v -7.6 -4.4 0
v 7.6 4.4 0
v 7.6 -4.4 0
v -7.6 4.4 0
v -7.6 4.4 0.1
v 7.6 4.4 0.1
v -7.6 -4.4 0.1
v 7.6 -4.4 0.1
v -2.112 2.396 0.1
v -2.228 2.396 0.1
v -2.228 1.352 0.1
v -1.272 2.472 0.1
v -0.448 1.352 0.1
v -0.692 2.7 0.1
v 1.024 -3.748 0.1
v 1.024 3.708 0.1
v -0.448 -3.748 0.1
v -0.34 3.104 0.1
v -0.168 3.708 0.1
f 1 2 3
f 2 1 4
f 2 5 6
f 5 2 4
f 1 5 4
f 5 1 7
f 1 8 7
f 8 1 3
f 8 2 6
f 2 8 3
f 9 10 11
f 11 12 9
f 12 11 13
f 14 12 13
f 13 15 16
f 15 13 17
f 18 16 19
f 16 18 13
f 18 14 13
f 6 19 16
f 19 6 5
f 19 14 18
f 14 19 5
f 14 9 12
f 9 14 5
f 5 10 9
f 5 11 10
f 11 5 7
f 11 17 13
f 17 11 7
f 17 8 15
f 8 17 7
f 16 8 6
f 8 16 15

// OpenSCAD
// file: ../p/4-4edge.scad
use <../lib.scad>
$fa=1; $fs=0.2;
function ldraw_lib__4_4edge(realsolid=false) = [
// 0 Circle 1.0
// 0 Name: 4-4edge.dat
// 0 Author: James Jessiman
// 0 !LDRAW_ORG Primitive UPDATE 2017-01
// 0 !LICENSE Licensed under CC BY 2.0 and CC BY 4.0 : see CAreadme.txt
// 
// 0 BFC CERTIFY CCW
  [0,"BFC","CERTIFY"],
  [0,"BFC","CCW"],
// 
// 0 !HISTORY 1998-12-15 [PTadmin] Official Update 1998-10
// 0 !HISTORY 2005-12-28 [PTadmin] Official Update 2005-01
// 0 !HISTORY 2007-06-24 [PTadmin] Header formatted for Contributor Agreement
// 0 !HISTORY 2008-07-01 [PTadmin] Official Update 2008-01
// 0 !HISTORY 2017-01-15 [Steffen] BFCed
// 0 !HISTORY 2017-12-30 [PTadmin] Official Update 2017-01
// 
// 
// 2 24 1 0 0 0.9239 0 0.3827
  [2,24,1,0,0,0.9239,0,0.3827],
// 2 24 0.9239 0 0.3827 0.7071 0 0.7071
  [2,24,0.9239,0,0.3827,0.7071,0,0.7071],
// 2 24 0.7071 0 0.7071 0.3827 0 0.9239
  [2,24,0.7071,0,0.7071,0.3827,0,0.9239],
// 2 24 0.3827 0 0.9239 0 0 1
  [2,24,0.3827,0,0.9239,0,0,1],
// 2 24 0 0 1 -0.3827 0 0.9239
  [2,24,0,0,1,-0.3827,0,0.9239],
// 2 24 -0.3827 0 0.9239 -0.7071 0 0.7071
  [2,24,-0.3827,0,0.9239,-0.7071,0,0.7071],
// 2 24 -0.7071 0 0.7071 -0.9239 0 0.3827
  [2,24,-0.7071,0,0.7071,-0.9239,0,0.3827],
// 2 24 -0.9239 0 0.3827 -1 0 -0
  [2,24,-0.9239,0,0.3827,-1,0,-0],
// 2 24 -1 0 -0 -0.9239 0 -0.3827
  [2,24,-1,0,-0,-0.9239,0,-0.3827],
// 2 24 -0.9239 0 -0.3827 -0.7071 0 -0.7071
  [2,24,-0.9239,0,-0.3827,-0.7071,0,-0.7071],
// 2 24 -0.7071 0 -0.7071 -0.3827 0 -0.9239
  [2,24,-0.7071,0,-0.7071,-0.3827,0,-0.9239],
// 2 24 -0.3827 0 -0.9239 0 0 -1
  [2,24,-0.3827,0,-0.9239,0,0,-1],
// 2 24 0 0 -1 0.3827 0 -0.9239
  [2,24,0,0,-1,0.3827,0,-0.9239],
// 2 24 0.3827 0 -0.9239 0.7071 0 -0.7071
  [2,24,0.3827,0,-0.9239,0.7071,0,-0.7071],
// 2 24 0.7071 0 -0.7071 0.9239 0 -0.3827
  [2,24,0.7071,0,-0.7071,0.9239,0,-0.3827],
// 2 24 0.9239 0 -0.3827 1 0 0
  [2,24,0.9239,0,-0.3827,1,0,0],
];
module ldraw_lib__4_4edge(step=0, col=false, unit=2/5, alt=false, line=0.2, solid=!$preview)
    makepoly(ldraw_lib__4_4edge(solid), step=step, col=col, unit=unit, alt=alt, line=line, solid=solid);
ldraw_lib__4_4edge(line=0.2);
// file: ../p/4-4disc.scad
use <../lib.scad>
$fa=1; $fs=0.2;
function ldraw_lib__4_4disc(realsolid=false) = [
// 0 Disc 1.0
// 0 Name: 4-4disc.dat
// 0 Author: James Jessiman
// 0 !LDRAW_ORG Primitive UPDATE 2002-02
// 0 !LICENSE Licensed under CC BY 2.0 and CC BY 4.0 : see CAreadme.txt
// 
// 0 BFC CERTIFY CCW
  [0,"BFC","CERTIFY"],
  [0,"BFC","CCW"],
// 
// 0 !HISTORY 1998-12-15 [PTadmin] Official Update 1998-10
// 0 !HISTORY 2002-03-23 [sbliss] Added BFC statement
// 0 !HISTORY 2002-04-25 [PTadmin] Official Update 2002-02
// 0 !HISTORY 2007-06-24 [PTadmin] Header formatted for Contributor Agreement
// 0 !HISTORY 2008-07-01 [PTadmin] Official Update 2008-01
// 
// 
// 3 16 0 0 0 1 0 0 0.9239 0 0.3827
  [3,16,0,0,0,1,0,0,0.9239,0,0.3827],
// 3 16 0 0 0 0.9239 0 0.3827 0.7071 0 0.7071
  [3,16,0,0,0,0.9239,0,0.3827,0.7071,0,0.7071],
// 3 16 0 0 0 0.7071 0 0.7071 0.3827 0 0.9239
  [3,16,0,0,0,0.7071,0,0.7071,0.3827,0,0.9239],
// 3 16 0 0 0 0.3827 0 0.9239 0 0 1
  [3,16,0,0,0,0.3827,0,0.9239,0,0,1],
// 3 16 0 0 0 0 0 1 -0.3827 0 0.9239
  [3,16,0,0,0,0,0,1,-0.3827,0,0.9239],
// 3 16 0 0 0 -0.3827 0 0.9239 -0.7071 0 0.7071
  [3,16,0,0,0,-0.3827,0,0.9239,-0.7071,0,0.7071],
// 3 16 0 0 0 -0.7071 0 0.7071 -0.9239 0 0.3827
  [3,16,0,0,0,-0.7071,0,0.7071,-0.9239,0,0.3827],
// 3 16 0 0 0 -0.9239 0 0.3827 -1 0 -0
  [3,16,0,0,0,-0.9239,0,0.3827,-1,0,-0],
// 3 16 0 0 0 -1 0 -0 -0.9239 0 -0.3827
  [3,16,0,0,0,-1,0,-0,-0.9239,0,-0.3827],
// 3 16 0 0 0 -0.9239 0 -0.3827 -0.7071 0 -0.7071
  [3,16,0,0,0,-0.9239,0,-0.3827,-0.7071,0,-0.7071],
// 3 16 0 0 0 -0.7071 0 -0.7071 -0.3827 0 -0.9239
  [3,16,0,0,0,-0.7071,0,-0.7071,-0.3827,0,-0.9239],
// 3 16 0 0 0 -0.3827 0 -0.9239 0 0 -1
  [3,16,0,0,0,-0.3827,0,-0.9239,0,0,-1],
// 3 16 0 0 0 0 0 -1 0.3827 0 -0.9239
  [3,16,0,0,0,0,0,-1,0.3827,0,-0.9239],
// 3 16 0 0 0 0.3827 0 -0.9239 0.7071 0 -0.7071
  [3,16,0,0,0,0.3827,0,-0.9239,0.7071,0,-0.7071],
// 3 16 0 0 0 0.7071 0 -0.7071 0.9239 0 -0.3827
  [3,16,0,0,0,0.7071,0,-0.7071,0.9239,0,-0.3827],
// 3 16 0 0 0 0.9239 0 -0.3827 1 0 0
  [3,16,0,0,0,0.9239,0,-0.3827,1,0,0],
// 0
];
module ldraw_lib__4_4disc(step=0, col=false, unit=2/5, alt=false, line=0.2, solid=!$preview)
    makepoly(ldraw_lib__4_4disc(solid), step=step, col=col, unit=unit, alt=alt, line=line, solid=solid);
ldraw_lib__4_4disc(line=0.2);
// file: ../p/4-4cyli.scad
use <../lib.scad>
$fa=1; $fs=0.2;
function ldraw_lib__4_4cyli(realsolid=false) = [
// 0 Cylinder 1.0
// 0 Name: 4-4cyli.dat
// 0 Author: James Jessiman
// 0 !LDRAW_ORG Primitive UPDATE 2005-01
// 0 !LICENSE Licensed under CC BY 2.0 and CC BY 4.0 : see CAreadme.txt
// 
// 0 BFC CERTIFY CCW
  [0,"BFC","CERTIFY"],
  [0,"BFC","CCW"],
// 
// 0 !HISTORY 1998-12-15 [PTadmin] Official Update 1998-10
// 0 !HISTORY 2002-03-23 [sbliss] Added BFC statement; merged headers from files in distributions LDraw 0.27 and Complete.
// 0 !HISTORY 2002-04-25 [PTadmin] Official Update 2002-02
// 0 !HISTORY 2004-12-14 [guyvivan] BFC CCW
// 0 !HISTORY 2005-12-28 [PTadmin] Official Update 2005-01
// 0 !HISTORY 2007-06-24 [PTadmin] Header formatted for Contributor Agreement
// 0 !HISTORY 2008-07-01 [PTadmin] Official Update 2008-01
// 
// 
// 4 16 1 1 0 0.9239 1 0.3827 0.9239 0 0.3827 1 0 0
  [4,16,1,1,0,0.9239,1,0.3827,0.9239,0,0.3827,1,0,0],
// 5 24 1 0 0 1 1 0 0.9239 0 0.3827 0.9239 0 -0.3827
  [5,24,1,0,0,1,1,0,0.9239,0,0.3827,0.9239,0,-0.3827],
// 4 16 0.9239 1 0.3827 0.7071 1 0.7071 0.7071 0 0.7071 0.9239 0 0.3827
  [4,16,0.9239,1,0.3827,0.7071,1,0.7071,0.7071,0,0.7071,0.9239,0,0.3827],
// 5 24 0.9239 0 0.3827 0.9239 1 0.3827 0.7071 0 0.7071 1 0 0
  [5,24,0.9239,0,0.3827,0.9239,1,0.3827,0.7071,0,0.7071,1,0,0],
// 4 16 0.7071 1 0.7071 0.3827 1 0.9239 0.3827 0 0.9239 0.7071 0 0.7071
  [4,16,0.7071,1,0.7071,0.3827,1,0.9239,0.3827,0,0.9239,0.7071,0,0.7071],
// 5 24 0.7071 0 0.7071 0.7071 1 0.7071 0.3827 0 0.9239 0.9239 0 0.3827
  [5,24,0.7071,0,0.7071,0.7071,1,0.7071,0.3827,0,0.9239,0.9239,0,0.3827],
// 4 16 0.3827 1 0.9239 0 1 1 0 0 1 0.3827 0 0.9239
  [4,16,0.3827,1,0.9239,0,1,1,0,0,1,0.3827,0,0.9239],
// 5 24 0.3827 0 0.9239 0.3827 1 0.9239 0 0 1 0.7071 0 0.7071
  [5,24,0.3827,0,0.9239,0.3827,1,0.9239,0,0,1,0.7071,0,0.7071],
// 4 16 0 1 1 -0.3827 1 0.9239 -0.3827 0 0.9239 0 0 1
  [4,16,0,1,1,-0.3827,1,0.9239,-0.3827,0,0.9239,0,0,1],
// 5 24 0 0 1 0 1 1 -0.3827 0 0.9239 0.3827 0 0.9239
  [5,24,0,0,1,0,1,1,-0.3827,0,0.9239,0.3827,0,0.9239],
// 4 16 -0.3827 1 0.9239 -0.7071 1 0.7071 -0.7071 0 0.7071 -0.3827 0 0.9239
  [4,16,-0.3827,1,0.9239,-0.7071,1,0.7071,-0.7071,0,0.7071,-0.3827,0,0.9239],
// 5 24 -0.3827 0 0.9239 -0.3827 1 0.9239 -0.7071 0 0.7071 0 0 1
  [5,24,-0.3827,0,0.9239,-0.3827,1,0.9239,-0.7071,0,0.7071,0,0,1],
// 4 16 -0.7071 1 0.7071 -0.9239 1 0.3827 -0.9239 0 0.3827 -0.7071 0 0.7071
  [4,16,-0.7071,1,0.7071,-0.9239,1,0.3827,-0.9239,0,0.3827,-0.7071,0,0.7071],
// 5 24 -0.7071 0 0.7071 -0.7071 1 0.7071 -0.9239 0 0.3827 -0.3827 0 0.9239
  [5,24,-0.7071,0,0.7071,-0.7071,1,0.7071,-0.9239,0,0.3827,-0.3827,0,0.9239],
// 4 16 -0.9239 1 0.3827 -1 1 0 -1 0 0 -0.9239 0 0.3827
  [4,16,-0.9239,1,0.3827,-1,1,0,-1,0,0,-0.9239,0,0.3827],
// 5 24 -0.9239 0 0.3827 -0.9239 1 0.3827 -1 0 0 -0.7071 0 0.7071
  [5,24,-0.9239,0,0.3827,-0.9239,1,0.3827,-1,0,0,-0.7071,0,0.7071],
// 4 16 -1 1 0 -0.9239 1 -0.3827 -0.9239 0 -0.3827 -1 0 0
  [4,16,-1,1,0,-0.9239,1,-0.3827,-0.9239,0,-0.3827,-1,0,0],
// 5 24 -1 0 0 -1 1 0 -0.9239 0 -0.3827 -0.9239 0 0.3827
  [5,24,-1,0,0,-1,1,0,-0.9239,0,-0.3827,-0.9239,0,0.3827],
// 4 16 -0.9239 1 -0.3827 -0.7071 1 -0.7071 -0.7071 0 -0.7071 -0.9239 0 -0.3827
  [4,16,-0.9239,1,-0.3827,-0.7071,1,-0.7071,-0.7071,0,-0.7071,-0.9239,0,-0.3827],
// 5 24 -0.9239 0 -0.3827 -0.9239 1 -0.3827 -0.7071 0 -0.7071 -1 0 0
  [5,24,-0.9239,0,-0.3827,-0.9239,1,-0.3827,-0.7071,0,-0.7071,-1,0,0],
// 4 16 -0.7071 1 -0.7071 -0.3827 1 -0.9239 -0.3827 0 -0.9239 -0.7071 0 -0.7071
  [4,16,-0.7071,1,-0.7071,-0.3827,1,-0.9239,-0.3827,0,-0.9239,-0.7071,0,-0.7071],
// 5 24 -0.7071 0 -0.7071 -0.7071 1 -0.7071 -0.3827 0 -0.9239 -0.9239 0 -0.3827
  [5,24,-0.7071,0,-0.7071,-0.7071,1,-0.7071,-0.3827,0,-0.9239,-0.9239,0,-0.3827],
// 4 16 -0.3827 1 -0.9239 0 1 -1 0 0 -1 -0.3827 0 -0.9239
  [4,16,-0.3827,1,-0.9239,0,1,-1,0,0,-1,-0.3827,0,-0.9239],
// 5 24 -0.3827 0 -0.9239 -0.3827 1 -0.9239 0 0 -1 -0.7071 0 -0.7071
  [5,24,-0.3827,0,-0.9239,-0.3827,1,-0.9239,0,0,-1,-0.7071,0,-0.7071],
// 4 16 0 1 -1 0.3827 1 -0.9239 0.3827 0 -0.9239 0 0 -1
  [4,16,0,1,-1,0.3827,1,-0.9239,0.3827,0,-0.9239,0,0,-1],
// 5 24 0 0 -1 0 1 -1 0.3827 0 -0.9239 -0.3827 0 -0.9239
  [5,24,0,0,-1,0,1,-1,0.3827,0,-0.9239,-0.3827,0,-0.9239],
// 4 16 0.3827 1 -0.9239 0.7071 1 -0.7071 0.7071 0 -0.7071 0.3827 0 -0.9239
  [4,16,0.3827,1,-0.9239,0.7071,1,-0.7071,0.7071,0,-0.7071,0.3827,0,-0.9239],
// 5 24 0.3827 0 -0.9239 0.3827 1 -0.9239 0.7071 0 -0.7071 0 0 -1
  [5,24,0.3827,0,-0.9239,0.3827,1,-0.9239,0.7071,0,-0.7071,0,0,-1],
// 4 16 0.7071 1 -0.7071 0.9239 1 -0.3827 0.9239 0 -0.3827 0.7071 0 -0.7071
  [4,16,0.7071,1,-0.7071,0.9239,1,-0.3827,0.9239,0,-0.3827,0.7071,0,-0.7071],
// 5 24 0.7071 0 -0.7071 0.7071 1 -0.7071 0.9239 0 -0.3827 0.3827 0 -0.9239
  [5,24,0.7071,0,-0.7071,0.7071,1,-0.7071,0.9239,0,-0.3827,0.3827,0,-0.9239],
// 4 16 0.9239 1 -0.3827 1 1 0 1 0 0 0.9239 0 -0.3827
  [4,16,0.9239,1,-0.3827,1,1,0,1,0,0,0.9239,0,-0.3827],
// 5 24 0.9239 0 -0.3827 0.9239 1 -0.3827 1 0 0 0.7071 0 -0.7071
  [5,24,0.9239,0,-0.3827,0.9239,1,-0.3827,1,0,0,0.7071,0,-0.7071],
// 0
];
module ldraw_lib__4_4cyli(step=0, col=false, unit=2/5, alt=false, line=0.2, solid=!$preview)
    makepoly(ldraw_lib__4_4cyli(solid), step=step, col=col, unit=unit, alt=alt, line=line, solid=solid);
ldraw_lib__4_4cyli(line=0.2);
// file: ../p/stud3.scad
use <../lib.scad>
use <4-4cyli.scad>
use <4-4disc.scad>
use <4-4edge.scad>
$fa=1; $fs=0.2;
function ldraw_lib__stud3(realsolid=false) = realsolid ? 
    [openscad(translate([0,0,-eps()], o=cylinder(4+eps(), r=4)),2)] : [
// 0 Stud Tube Solid
// 0 Name: stud3.dat
// 0 Author: James Jessiman
// 0 !LDRAW_ORG Primitive UPDATE 2012-01
// 0 !LICENSE Licensed under CC BY 2.0 and CC BY 4.0 : see CAreadme.txt
// 
// 0 BFC CERTIFY CCW
  [0,"BFC","CERTIFY"],
  [0,"BFC","CCW"],
// 
// 0 !HISTORY 2002-04-04 [sbliss] Modified for BFC compliance
// 0 !HISTORY 2002-04-25 [PTadmin] Official Update 2002-02
// 0 !HISTORY 2007-06-24 [PTadmin] Header formatted for Contributor Agreement
// 0 !HISTORY 2008-07-01 [PTadmin] Official Update 2008-01
// 0 !HISTORY 2012-02-16 [Philo] Changed to CCW
// 0 !HISTORY 2012-03-30 [PTadmin] Official Update 2012-01
// 
// 
// 1 16 0 -4 0 4 0 0 0 1 0 0 0 4 4-4edge.dat
  [1,16,0,-4,0,4,0,0,0,1,0,0,0,4, ldraw_lib__4_4edge(realsolid)],
// 1 16 0 0 0 4 0 0 0 1 0 0 0 4 4-4edge.dat
  [1,16,0,0,0,4,0,0,0,1,0,0,0,4, ldraw_lib__4_4edge(realsolid)],
// 1 16 0 -4 0 4 0 0 0 1 0 0 0 4 4-4disc.dat
  [1,16,0,-4,0,4,0,0,0,1,0,0,0,4, ldraw_lib__4_4disc(realsolid)],
// 1 16 0 -4 0 4 0 0 0 4 0 0 0 4 4-4cyli.dat
  [1,16,0,-4,0,4,0,0,0,4,0,0,0,4, ldraw_lib__4_4cyli(realsolid)],
];
module ldraw_lib__stud3(step=0, col=false, unit=2/5, alt=false, line=0.2, solid=!$preview)
    makepoly(ldraw_lib__stud3(solid), step=step, col=col, unit=unit, alt=alt, line=line, solid=solid);
ldraw_lib__stud3(line=0.2);
// file: ../p/stud.scad
use <../lib.scad>
use <4-4cyli.scad>
use <4-4disc.scad>
use <4-4edge.scad>
$fa=1; $fs=0.2;
function ldraw_lib__stud(realsolid=false) = realsolid ? 
    [openscad(translate([0,0,-eps()], o=cylinder(4+eps(), r=6)),2)] : [
// 0 Stud
// 0 Name: stud.dat
// 0 Author: James Jessiman
// 0 !LDRAW_ORG Primitive UPDATE 2012-01
// 0 !LICENSE Licensed under CC BY 2.0 and CC BY 4.0 : see CAreadme.txt
// 
// 0 BFC CERTIFY CCW
  [0,"BFC","CERTIFY"],
  [0,"BFC","CCW"],
// 
// 0 !HISTORY 2002-04-04 [sbliss] Modified for BFC compliance
// 0 !HISTORY 2002-04-25 [PTadmin] Official Update 2002-02
// 0 !HISTORY 2007-06-24 [PTadmin] Header formatted for Contributor Agreement
// 0 !HISTORY 2008-07-01 [PTadmin] Official Update 2008-01
// 0 !HISTORY 2012-02-16 [Philo] Changed to CCW
// 0 !HISTORY 2012-03-30 [PTadmin] Official Update 2012-01
// 
// 
// 1 16 0 0 0 6 0 0 0 1 0 0 0 6 4-4edge.dat
  [1,16,0,0,0,6,0,0,0,1,0,0,0,6, ldraw_lib__4_4edge(realsolid)],
// 1 16 0 -4 0 6 0 0 0 1 0 0 0 6 4-4edge.dat
  [1,16,0,-4,0,6,0,0,0,1,0,0,0,6, ldraw_lib__4_4edge(realsolid)],
// 1 16 0 0 0 6 0 0 0 -4 0 0 0 6 4-4cyli.dat
  [1,16,0,0,0,6,0,0,0,-4,0,0,0,6, ldraw_lib__4_4cyli(realsolid)],
// 1 16 0 -4 0 6 0 0 0 1 0 0 0 6 4-4disc.dat
  [1,16,0,-4,0,6,0,0,0,1,0,0,0,6, ldraw_lib__4_4disc(realsolid)],
];
module ldraw_lib__stud(step=0, col=false, unit=2/5, alt=false, line=0.2, solid=!$preview)
    makepoly(ldraw_lib__stud(solid), step=step, col=col, unit=unit, alt=alt, line=line, solid=solid);
ldraw_lib__stud(line=0.2);
// file: ../p/box5.scad
use <../lib.scad>
$fa=1; $fs=0.2;
function ldraw_lib__box5(realsolid=false) = [
// 0 Box with 5 Faces and All Edges
// 0 Name: box5.dat
// 0 Author: James Jessiman
// 0 !LDRAW_ORG Primitive UPDATE 2012-01
// 0 !LICENSE Licensed under CC BY 2.0 and CC BY 4.0 : see CAreadme.txt
// 
// 0 BFC CERTIFY CCW
  [0,"BFC","CERTIFY"],
  [0,"BFC","CCW"],
// 
// 0 !HISTORY 2002-04-03 [sbliss] Modified for BFC compliance
// 0 !HISTORY 2002-04-25 [PTadmin] Official Update 2002-02
// 0 !HISTORY 2007-06-24 [PTadmin] Header formatted for Contributor Agreement
// 0 !HISTORY 2008-07-01 [PTadmin] Official Update 2008-01
// 0 !HISTORY 2012-02-16 [Philo] Changed to CCW
// 0 !HISTORY 2012-03-30 [PTadmin] Official Update 2012-01
// 
// 
// 2 24 1 1 1 -1 1 1
  [2,24,1,1,1,-1,1,1],
// 2 24 -1 1 1 -1 1 -1
  [2,24,-1,1,1,-1,1,-1],
// 2 24 -1 1 -1 1 1 -1
  [2,24,-1,1,-1,1,1,-1],
// 2 24 1 1 -1 1 1 1
  [2,24,1,1,-1,1,1,1],
// 2 24 1 0 1 -1 0 1
  [2,24,1,0,1,-1,0,1],
// 2 24 -1 0 1 -1 0 -1
  [2,24,-1,0,1,-1,0,-1],
// 2 24 -1 0 -1 1 0 -1
  [2,24,-1,0,-1,1,0,-1],
// 2 24 1 0 -1 1 0 1
  [2,24,1,0,-1,1,0,1],
// 2 24 1 0 1 1 1 1
  [2,24,1,0,1,1,1,1],
// 2 24 -1 0 1 -1 1 1
  [2,24,-1,0,1,-1,1,1],
// 2 24 1 0 -1 1 1 -1
  [2,24,1,0,-1,1,1,-1],
// 2 24 -1 0 -1 -1 1 -1
  [2,24,-1,0,-1,-1,1,-1],
// 4 16 -1 1 1 1 1 1 1 1 -1 -1 1 -1
  [4,16,-1,1,1,1,1,1,1,1,-1,-1,1,-1],
// 4 16 -1 1 1 -1 0 1 1 0 1 1 1 1
  [4,16,-1,1,1,-1,0,1,1,0,1,1,1,1],
// 4 16 -1 1 -1 -1 0 -1 -1 0 1 -1 1 1
  [4,16,-1,1,-1,-1,0,-1,-1,0,1,-1,1,1],
// 4 16 1 1 -1 1 0 -1 -1 0 -1 -1 1 -1
  [4,16,1,1,-1,1,0,-1,-1,0,-1,-1,1,-1],
// 4 16 1 1 1 1 0 1 1 0 -1 1 1 -1
  [4,16,1,1,1,1,0,1,1,0,-1,1,1,-1],
];
module ldraw_lib__box5(step=0, col=false, unit=2/5, alt=false, line=0.2, solid=!$preview)
    makepoly(ldraw_lib__box5(solid), step=step, col=col, unit=unit, alt=alt, line=line, solid=solid);
ldraw_lib__box5(line=0.2);
// file: ../p/box4t.scad
use <../lib.scad>
$fa=1; $fs=0.2;
function ldraw_lib__box4t(realsolid=false) = [
// 0 Box with 4 Adjacent Faces and All Edges
// 0 Name: box4t.dat
// 0 Author: Tore Eriksson [Tore_Eriksson]
// 0 !LDRAW_ORG Primitive UPDATE 2003-02
// 0 !LICENSE Licensed under CC BY 2.0 and CC BY 4.0 : see CAreadme.txt
// 
// 0 BFC CERTIFY CCW
  [0,"BFC","CERTIFY"],
  [0,"BFC","CCW"],
// 
// 0 !HISTORY 1997-09-29 [PTadmin] Official Update 1997-15
// 0 !HISTORY 2002-08-31 [izanette] Modified with WINDZ for BFC compliance
// 0 !HISTORY 2003-08-01 [PTadmin] Official Update 2003-02
// 0 !HISTORY 2007-06-24 [PTadmin] Header formatted for Contributor Agreement
// 0 !HISTORY 2008-07-01 [PTadmin] Official Update 2008-01
// 
// 
// 2 24 1 1 1 -1 1 1
  [2,24,1,1,1,-1,1,1],
// 2 24 -1 1 1 -1 1 -1
  [2,24,-1,1,1,-1,1,-1],
// 2 24 -1 1 -1 1 1 -1
  [2,24,-1,1,-1,1,1,-1],
// 2 24 1 1 -1 1 1 1
  [2,24,1,1,-1,1,1,1],
// 2 24 1 0 1 -1 0 1
  [2,24,1,0,1,-1,0,1],
// 2 24 -1 0 1 -1 0 -1
  [2,24,-1,0,1,-1,0,-1],
// 2 24 -1 0 -1 1 0 -1
  [2,24,-1,0,-1,1,0,-1],
// 2 24 1 0 -1 1 0 1
  [2,24,1,0,-1,1,0,1],
// 2 24 1 0 1 1 1 1
  [2,24,1,0,1,1,1,1],
// 2 24 -1 0 1 -1 1 1
  [2,24,-1,0,1,-1,1,1],
// 2 24 1 0 -1 1 1 -1
  [2,24,1,0,-1,1,1,-1],
// 2 24 -1 0 -1 -1 1 -1
  [2,24,-1,0,-1,-1,1,-1],
// 4 16 1 1 1 1 1 -1 -1 1 -1 -1 1 1
  [4,16,1,1,1,1,1,-1,-1,1,-1,-1,1,1],
// 4 16 1 1 1 -1 1 1 -1 0 1 1 0 1
  [4,16,1,1,1,-1,1,1,-1,0,1,1,0,1],
// 4 16 -1 1 1 -1 1 -1 -1 0 -1 -1 0 1
  [4,16,-1,1,1,-1,1,-1,-1,0,-1,-1,0,1],
// 0 4 16 -1 1 -1 -1 0 -1 1 0 -1 1 1 -1
// 4 16 1 1 -1 1 1 1 1 0 1 1 0 -1
  [4,16,1,1,-1,1,1,1,1,0,1,1,0,-1],
// 0
];
module ldraw_lib__box4t(step=0, col=false, unit=2/5, alt=false, line=0.2, solid=!$preview)
    makepoly(ldraw_lib__box4t(solid), step=step, col=col, unit=unit, alt=alt, line=line, solid=solid);
ldraw_lib__box4t(line=0.2);
// file: s/3004s01.scad
use <../../lib.scad>
use <../../p/box4t.scad>
use <../../p/box5.scad>
use <../../p/stud.scad>
use <../../p/stud3.scad>
$fa=1; $fs=0.2;
function ldraw_lib__s__3004s01(realsolid=false) = [
// 0 ~Brick  1 x  2 without Front Face
// 0 Name: s\3004s01.dat
// 0 Author: James Jessiman
// 0 !LDRAW_ORG Subpart UPDATE 2003-03
// 0 !LICENSE Licensed under CC BY 2.0 and CC BY 4.0 : see CAreadme.txt
// 
// 0 BFC CERTIFY CCW
  [0,"BFC","CERTIFY"],
  [0,"BFC","CCW"],
// 
// 0 !HISTORY 2003-09-07 [jriley] Subfiling, BFC
// 0 !HISTORY 2003-12-19 [PTadmin] Official Update 2003-03
// 0 !HISTORY 2007-08-29 [PTadmin] Header formatted for Contributor Agreement
// 0 !HISTORY 2008-07-01 [PTadmin] Official Update 2008-01
// 
// 
// 1 16 0 4 0 1 0 0 0 -5 0 0 0 1 stud3.dat
  [1,16,0,4,0,1,0,0,0,-5,0,0,0,1, ldraw_lib__stud3(realsolid)],
// 0 BFC INVERTNEXT
  [0,"BFC","INVERTNEXT"],
// 1 16 0 24 0 16 0 0 0 -20 0 0 0 6 box5.dat
  [1,16,0,24,0,16,0,0,0,-20,0,0,0,6, ldraw_lib__box5(realsolid)],
// 4 16 20 24 10 16 24 6 -16 24 6 -20 24 10
  [4,16,20,24,10,16,24,6,-16,24,6,-20,24,10],
// 4 16 -20 24 10 -16 24 6 -16 24 -6 -20 24 -10
  [4,16,-20,24,10,-16,24,6,-16,24,-6,-20,24,-10],
// 4 16 -20 24 -10 -16 24 -6 16 24 -6 20 24 -10
  [4,16,-20,24,-10,-16,24,-6,16,24,-6,20,24,-10],
// 4 16 20 24 -10 16 24 -6 16 24 6 20 24 10
  [4,16,20,24,-10,16,24,-6,16,24,6,20,24,10],
// 1 16 0 24 0 20 0 0 0 -24 0 0 0 10 box4t.dat
  [1,16,0,24,0,20,0,0,0,-24,0,0,0,10, ldraw_lib__box4t(realsolid)],
// 1 16 10 0 0 1 0 0 0 1 0 0 0 1 stud.dat
  [1,16,10,0,0,1,0,0,0,1,0,0,0,1, ldraw_lib__stud(realsolid)],
// 1 16 -10 0 0 1 0 0 0 1 0 0 0 1 stud.dat
  [1,16,-10,0,0,1,0,0,0,1,0,0,0,1, ldraw_lib__stud(realsolid)],
// 0
];
module ldraw_lib__s__3004s01(step=0, col=false, unit=2/5, alt=false, line=0.2, solid=!$preview)
    makepoly(ldraw_lib__s__3004s01(solid), step=step, col=col, unit=unit, alt=alt, line=line, solid=solid);
ldraw_lib__s__3004s01(line=0.2);
// file: 3004.scad
use <../lib.scad>
use <s/3004s01.scad>
$fa=1; $fs=0.2;
function ldraw_lib__3004(realsolid=false) = [
// 0 Brick  1 x  2
// 0 Name: 3004.dat
// 0 Author: James Jessiman
// 0 !LDRAW_ORG Part UPDATE 2022-05
// 0 !LICENSE Licensed under CC BY 2.0 and CC BY 4.0 : see CAreadme.txt
// 
// 0 BFC CERTIFY CCW
  [0,"BFC","CERTIFY"],
  [0,"BFC","CCW"],
// 
// 0 !HISTORY 2001-10-26 [PTadmin] Official Update 2001-01
// 0 !HISTORY 2002-05-07 {unknown} BFC Certification
// 0 !HISTORY 2002-06-11 [PTadmin] Official Update 2002-03
// 0 !HISTORY 2007-05-07 [PTadmin] Header formatted for Contributor Agreement
// 0 !HISTORY 2008-07-01 [PTadmin] Official Update 2008-01
// 0 !HISTORY 2022-08-04 [MagFors] Using subfile
// 0 !HISTORY 2022-09-15 [PTadmin] Official Update 2022-05
// 
// 
// 1 16 0 0 0 1 0 0 0 1 0 0 0 1 s\3004s01.dat
  [1,16,0,0,0,1,0,0,0,1,0,0,0,1, ldraw_lib__s__3004s01(realsolid)],
// 4 16 -20 24 -10 20 24 -10 20 0 -10 -20 0 -10
  [4,16,-20,24,-10,20,24,-10,20,0,-10,-20,0,-10],
];
module ldraw_lib__3004(step=0, col=false, unit=2/5, alt=false, line=0.2, solid=!$preview)
    makepoly(ldraw_lib__3004(solid), step=step, col=col, unit=unit, alt=alt, line=line, solid=solid);
ldraw_lib__3004(line=0.2);
// file: s/004452bs02.scad
use <../../lib.scad>
$fa=1; $fs=0.2;
function ldraw_lib__s__004452bs02(realsolid=false) = [
// 0 ~Sticker  1.1 x  1.9 with Number "1" - Background
// 0 Name: s\004452bs02.dat
// 0 Author: Takeshi Takahashi [RainbowDolphin]
// 0 !LDRAW_ORG Subpart UPDATE 2022-04
// 0 !LICENSE Licensed under CC BY 2.0 and CC BY 4.0 : see CAreadme.txt
// 
// 0 BFC CERTIFY CCW
  [0,"BFC","CERTIFY"],
  [0,"BFC","CCW"],
// 
// 0 !HISTORY 2022-07-18 [PTadmin] Official Update 2022-04
// 
// 
// 4 16 -19 -.25 11 -.42 -.25 9.27 2.56 -.25 9.27 19 -.25 11
  [4,16,-19,-.25,11,-.42,-.25,9.27,2.56,-.25,9.27,19,-.25,11],
// 4 16 -.85 -.25 7.76 -.42 -.25 9.27 -19 -.25 11 -1.73 -.25 6.75
  [4,16,-.85,-.25,7.76,-.42,-.25,9.27,-19,-.25,11,-1.73,-.25,6.75],
// 4 16 -3.18 -.25 6.18 -1.73 -.25 6.75 -19 -.25 11 -5.28 -.25 5.99
  [4,16,-3.18,-.25,6.18,-1.73,-.25,6.75,-19,-.25,11,-5.28,-.25,5.99],
// 3 16 -19 -.25 11 -5.57 -.25 5.99 -5.28 -.25 5.99
  [3,16,-19,-.25,11,-5.57,-.25,5.99,-5.28,-.25,5.99],
// 4 16 -5.57 -.25 3.38 -5.57 -.25 5.99 -19 -.25 11 -19 -.25 -11
  [4,16,-5.57,-.25,3.38,-5.57,-.25,5.99,-19,-.25,11,-19,-.25,-11],
// 4 16 -1.12 -.25 3.38 -5.57 -.25 3.38 -19 -.25 -11 -1.12 -.25 -9.37
  [4,16,-1.12,-.25,3.38,-5.57,-.25,3.38,-19,-.25,-11,-1.12,-.25,-9.37],
// 4 16 2.56 -.25 -9.37 -1.12 -.25 -9.37 -19 -.25 -11 19 -.25 -11
  [4,16,2.56,-.25,-9.37,-1.12,-.25,-9.37,-19,-.25,-11,19,-.25,-11],
// 4 16 2.56 -.25 9.27 2.56 -.25 -9.37 19 -.25 -11 19 -.25 11
  [4,16,2.56,-.25,9.27,2.56,-.25,-9.37,19,-.25,-11,19,-.25,11],
];
module ldraw_lib__s__004452bs02(step=0, col=false, unit=2/5, alt=false, line=0.2, solid=!$preview)
    makepoly(ldraw_lib__s__004452bs02(solid), step=step, col=col, unit=unit, alt=alt, line=line, solid=solid);
ldraw_lib__s__004452bs02(line=0.2);
// file: s/004452bs01.scad
use <../../lib.scad>
$fa=1; $fs=0.2;
function ldraw_lib__s__004452bs01(realsolid=false) = [
// 0 ~Sticker  1.1 x  1.9 with Number "1" - Type Face
// 0 Name: s\004452bs01.dat
// 0 Author: Takeshi Takahashi [RainbowDolphin]
// 0 !LDRAW_ORG Subpart UPDATE 2022-04
// 0 !LICENSE Licensed under CC BY 2.0 and CC BY 4.0 : see CAreadme.txt
// 
// 0 BFC CERTIFY CCW
  [0,"BFC","CERTIFY"],
  [0,"BFC","CCW"],
// 
// 0 !HISTORY 2022-07-18 [PTadmin] Official Update 2022-04
// 
// 
// 3 16 -5.28 -.25 5.99 -5.57 -.25 5.99 -5.57 -.25 3.38
  [3,16,-5.28,-.25,5.99,-5.57,-.25,5.99,-5.57,-.25,3.38],
// 4 16 -3.18 -.25 6.18 -5.28 -.25 5.99 -5.57 -.25 3.38 -1.12 -.25 3.38
  [4,16,-3.18,-.25,6.18,-5.28,-.25,5.99,-5.57,-.25,3.38,-1.12,-.25,3.38],
// 3 16 -1.73 -.25 6.75 -3.18 -.25 6.18 -1.12 -.25 3.38
  [3,16,-1.73,-.25,6.75,-3.18,-.25,6.18,-1.12,-.25,3.38],
// 4 16 -1.12 -.25 3.38 -1.12 -.25 -9.37 2.56 -.25 -9.37 2.56 -.25 9.27
  [4,16,-1.12,-.25,3.38,-1.12,-.25,-9.37,2.56,-.25,-9.37,2.56,-.25,9.27],
// 4 16 2.56 -.25 9.27 -.42 -.25 9.27 -.85 -.25 7.76 -1.12 -.25 3.38
  [4,16,2.56,-.25,9.27,-.42,-.25,9.27,-.85,-.25,7.76,-1.12,-.25,3.38],
// 3 16 -.85 -.25 7.76 -1.73 -.25 6.75 -1.12 -.25 3.38
  [3,16,-.85,-.25,7.76,-1.73,-.25,6.75,-1.12,-.25,3.38],
];
module ldraw_lib__s__004452bs01(step=0, col=false, unit=2/5, alt=false, line=0.2, solid=!$preview)
    makepoly(ldraw_lib__s__004452bs01(solid), step=step, col=col, unit=unit, alt=alt, line=line, solid=solid);
ldraw_lib__s__004452bs01(line=0.2);
// file: ../p/box5-12.scad
use <../lib.scad>
$fa=1; $fs=0.2;
function ldraw_lib__box5_12(realsolid=false) = [
// 0 Box with 5 Faces without Any Edges
// 0 Name: box5-12.dat
// 0 Author: Chris Dee [cwdee]
// 0 !LDRAW_ORG Primitive UPDATE 2009-02
// 0 !LICENSE Licensed under CC BY 2.0 and CC BY 4.0 : see CAreadme.txt
// 
// 0 BFC CERTIFY CCW
  [0,"BFC","CERTIFY"],
  [0,"BFC","CCW"],
// 
// 0 !HISTORY 2009-09-03 [PTadmin] Official Update 2009-02
// 
// 
// 4 16 1 1 1 1 1 -1 -1 1 -1 -1 1 1
  [4,16,1,1,1,1,1,-1,-1,1,-1,-1,1,1],
// 4 16 -1 0 1 1 0 1 1 1 1 -1 1 1
  [4,16,-1,0,1,1,0,1,1,1,1,-1,1,1],
// 4 16 -1 0 -1 -1 0 1 -1 1 1 -1 1 -1
  [4,16,-1,0,-1,-1,0,1,-1,1,1,-1,1,-1],
// 4 16 1 0 -1 -1 0 -1 -1 1 -1 1 1 -1
  [4,16,1,0,-1,-1,0,-1,-1,1,-1,1,1,-1],
// 4 16 1 0 1 1 0 -1 1 1 -1 1 1 1
  [4,16,1,0,1,1,0,-1,1,1,-1,1,1,1],
// 0
];
module ldraw_lib__box5_12(step=0, col=false, unit=2/5, alt=false, line=0.2, solid=!$preview)
    makepoly(ldraw_lib__box5_12(solid), step=step, col=col, unit=unit, alt=alt, line=line, solid=solid);
ldraw_lib__box5_12(line=0.2);
// main file
use <../lib.scad>
use <../p/box5-12.scad>
use <s/004452bs01.scad>
use <s/004452bs02.scad>
$fa=1; $fs=0.2;
function ldraw_lib__004659f(realsolid=false) = [
// 0 Sticker  1.1 x  1.9 with White Number "1" on Red Background
// 0 Name: 004659f.dat
// 0 Author: Alex Taylor [anathema]
// 0 !LDRAW_ORG Part UPDATE 2022-04
// 0 !LICENSE Licensed under CC BY 2.0 and CC BY 4.0 : see CAreadme.txt
// 
// 0 BFC CERTIFY CCW
  [0,"BFC","CERTIFY"],
  [0,"BFC","CCW"],
// 
// 0 !KEYWORDS Fire Station, Set 590-1
// 
// 0 !HISTORY 2019-09-08 [anathema] Original pattern using TEXMAP
// 0 !HISTORY 2021-03-09 [RainbowDolphin] Vectorized the pattern and used common subfile with 004452b
// 0 !HISTORY 2022-07-18 [PTadmin] Official Update 2022-04
// 
// 
// 1 16 0 -0.25 0 19 0 0 0 0.25 0 0 0 11 box5-12.dat
  [1,16,0,-0.25,0,19,0,0,0,0.25,0,0,0,11, ldraw_lib__box5_12(realsolid)],
// 1 15 0 0 0 1 0 0 0 1 0 0 0 1 s\004452bs01.dat
  [1,15,0,0,0,1,0,0,0,1,0,0,0,1, ldraw_lib__s__004452bs01(realsolid)],
// 1 4 0 0 0 1 0 0 0 1 0 0 0 1 s\004452bs02.dat
  [1,4,0,0,0,1,0,0,0,1,0,0,0,1, ldraw_lib__s__004452bs02(realsolid)],
];
module ldraw_lib__004659f(step=0, col=false, unit=2/5, alt=false, line=0.2, solid=!$preview)
    makepoly(ldraw_lib__004659f(solid), step=step, col=col, unit=unit, alt=alt, line=line, solid=solid);
ldraw_lib__004659f(line=0.2);
